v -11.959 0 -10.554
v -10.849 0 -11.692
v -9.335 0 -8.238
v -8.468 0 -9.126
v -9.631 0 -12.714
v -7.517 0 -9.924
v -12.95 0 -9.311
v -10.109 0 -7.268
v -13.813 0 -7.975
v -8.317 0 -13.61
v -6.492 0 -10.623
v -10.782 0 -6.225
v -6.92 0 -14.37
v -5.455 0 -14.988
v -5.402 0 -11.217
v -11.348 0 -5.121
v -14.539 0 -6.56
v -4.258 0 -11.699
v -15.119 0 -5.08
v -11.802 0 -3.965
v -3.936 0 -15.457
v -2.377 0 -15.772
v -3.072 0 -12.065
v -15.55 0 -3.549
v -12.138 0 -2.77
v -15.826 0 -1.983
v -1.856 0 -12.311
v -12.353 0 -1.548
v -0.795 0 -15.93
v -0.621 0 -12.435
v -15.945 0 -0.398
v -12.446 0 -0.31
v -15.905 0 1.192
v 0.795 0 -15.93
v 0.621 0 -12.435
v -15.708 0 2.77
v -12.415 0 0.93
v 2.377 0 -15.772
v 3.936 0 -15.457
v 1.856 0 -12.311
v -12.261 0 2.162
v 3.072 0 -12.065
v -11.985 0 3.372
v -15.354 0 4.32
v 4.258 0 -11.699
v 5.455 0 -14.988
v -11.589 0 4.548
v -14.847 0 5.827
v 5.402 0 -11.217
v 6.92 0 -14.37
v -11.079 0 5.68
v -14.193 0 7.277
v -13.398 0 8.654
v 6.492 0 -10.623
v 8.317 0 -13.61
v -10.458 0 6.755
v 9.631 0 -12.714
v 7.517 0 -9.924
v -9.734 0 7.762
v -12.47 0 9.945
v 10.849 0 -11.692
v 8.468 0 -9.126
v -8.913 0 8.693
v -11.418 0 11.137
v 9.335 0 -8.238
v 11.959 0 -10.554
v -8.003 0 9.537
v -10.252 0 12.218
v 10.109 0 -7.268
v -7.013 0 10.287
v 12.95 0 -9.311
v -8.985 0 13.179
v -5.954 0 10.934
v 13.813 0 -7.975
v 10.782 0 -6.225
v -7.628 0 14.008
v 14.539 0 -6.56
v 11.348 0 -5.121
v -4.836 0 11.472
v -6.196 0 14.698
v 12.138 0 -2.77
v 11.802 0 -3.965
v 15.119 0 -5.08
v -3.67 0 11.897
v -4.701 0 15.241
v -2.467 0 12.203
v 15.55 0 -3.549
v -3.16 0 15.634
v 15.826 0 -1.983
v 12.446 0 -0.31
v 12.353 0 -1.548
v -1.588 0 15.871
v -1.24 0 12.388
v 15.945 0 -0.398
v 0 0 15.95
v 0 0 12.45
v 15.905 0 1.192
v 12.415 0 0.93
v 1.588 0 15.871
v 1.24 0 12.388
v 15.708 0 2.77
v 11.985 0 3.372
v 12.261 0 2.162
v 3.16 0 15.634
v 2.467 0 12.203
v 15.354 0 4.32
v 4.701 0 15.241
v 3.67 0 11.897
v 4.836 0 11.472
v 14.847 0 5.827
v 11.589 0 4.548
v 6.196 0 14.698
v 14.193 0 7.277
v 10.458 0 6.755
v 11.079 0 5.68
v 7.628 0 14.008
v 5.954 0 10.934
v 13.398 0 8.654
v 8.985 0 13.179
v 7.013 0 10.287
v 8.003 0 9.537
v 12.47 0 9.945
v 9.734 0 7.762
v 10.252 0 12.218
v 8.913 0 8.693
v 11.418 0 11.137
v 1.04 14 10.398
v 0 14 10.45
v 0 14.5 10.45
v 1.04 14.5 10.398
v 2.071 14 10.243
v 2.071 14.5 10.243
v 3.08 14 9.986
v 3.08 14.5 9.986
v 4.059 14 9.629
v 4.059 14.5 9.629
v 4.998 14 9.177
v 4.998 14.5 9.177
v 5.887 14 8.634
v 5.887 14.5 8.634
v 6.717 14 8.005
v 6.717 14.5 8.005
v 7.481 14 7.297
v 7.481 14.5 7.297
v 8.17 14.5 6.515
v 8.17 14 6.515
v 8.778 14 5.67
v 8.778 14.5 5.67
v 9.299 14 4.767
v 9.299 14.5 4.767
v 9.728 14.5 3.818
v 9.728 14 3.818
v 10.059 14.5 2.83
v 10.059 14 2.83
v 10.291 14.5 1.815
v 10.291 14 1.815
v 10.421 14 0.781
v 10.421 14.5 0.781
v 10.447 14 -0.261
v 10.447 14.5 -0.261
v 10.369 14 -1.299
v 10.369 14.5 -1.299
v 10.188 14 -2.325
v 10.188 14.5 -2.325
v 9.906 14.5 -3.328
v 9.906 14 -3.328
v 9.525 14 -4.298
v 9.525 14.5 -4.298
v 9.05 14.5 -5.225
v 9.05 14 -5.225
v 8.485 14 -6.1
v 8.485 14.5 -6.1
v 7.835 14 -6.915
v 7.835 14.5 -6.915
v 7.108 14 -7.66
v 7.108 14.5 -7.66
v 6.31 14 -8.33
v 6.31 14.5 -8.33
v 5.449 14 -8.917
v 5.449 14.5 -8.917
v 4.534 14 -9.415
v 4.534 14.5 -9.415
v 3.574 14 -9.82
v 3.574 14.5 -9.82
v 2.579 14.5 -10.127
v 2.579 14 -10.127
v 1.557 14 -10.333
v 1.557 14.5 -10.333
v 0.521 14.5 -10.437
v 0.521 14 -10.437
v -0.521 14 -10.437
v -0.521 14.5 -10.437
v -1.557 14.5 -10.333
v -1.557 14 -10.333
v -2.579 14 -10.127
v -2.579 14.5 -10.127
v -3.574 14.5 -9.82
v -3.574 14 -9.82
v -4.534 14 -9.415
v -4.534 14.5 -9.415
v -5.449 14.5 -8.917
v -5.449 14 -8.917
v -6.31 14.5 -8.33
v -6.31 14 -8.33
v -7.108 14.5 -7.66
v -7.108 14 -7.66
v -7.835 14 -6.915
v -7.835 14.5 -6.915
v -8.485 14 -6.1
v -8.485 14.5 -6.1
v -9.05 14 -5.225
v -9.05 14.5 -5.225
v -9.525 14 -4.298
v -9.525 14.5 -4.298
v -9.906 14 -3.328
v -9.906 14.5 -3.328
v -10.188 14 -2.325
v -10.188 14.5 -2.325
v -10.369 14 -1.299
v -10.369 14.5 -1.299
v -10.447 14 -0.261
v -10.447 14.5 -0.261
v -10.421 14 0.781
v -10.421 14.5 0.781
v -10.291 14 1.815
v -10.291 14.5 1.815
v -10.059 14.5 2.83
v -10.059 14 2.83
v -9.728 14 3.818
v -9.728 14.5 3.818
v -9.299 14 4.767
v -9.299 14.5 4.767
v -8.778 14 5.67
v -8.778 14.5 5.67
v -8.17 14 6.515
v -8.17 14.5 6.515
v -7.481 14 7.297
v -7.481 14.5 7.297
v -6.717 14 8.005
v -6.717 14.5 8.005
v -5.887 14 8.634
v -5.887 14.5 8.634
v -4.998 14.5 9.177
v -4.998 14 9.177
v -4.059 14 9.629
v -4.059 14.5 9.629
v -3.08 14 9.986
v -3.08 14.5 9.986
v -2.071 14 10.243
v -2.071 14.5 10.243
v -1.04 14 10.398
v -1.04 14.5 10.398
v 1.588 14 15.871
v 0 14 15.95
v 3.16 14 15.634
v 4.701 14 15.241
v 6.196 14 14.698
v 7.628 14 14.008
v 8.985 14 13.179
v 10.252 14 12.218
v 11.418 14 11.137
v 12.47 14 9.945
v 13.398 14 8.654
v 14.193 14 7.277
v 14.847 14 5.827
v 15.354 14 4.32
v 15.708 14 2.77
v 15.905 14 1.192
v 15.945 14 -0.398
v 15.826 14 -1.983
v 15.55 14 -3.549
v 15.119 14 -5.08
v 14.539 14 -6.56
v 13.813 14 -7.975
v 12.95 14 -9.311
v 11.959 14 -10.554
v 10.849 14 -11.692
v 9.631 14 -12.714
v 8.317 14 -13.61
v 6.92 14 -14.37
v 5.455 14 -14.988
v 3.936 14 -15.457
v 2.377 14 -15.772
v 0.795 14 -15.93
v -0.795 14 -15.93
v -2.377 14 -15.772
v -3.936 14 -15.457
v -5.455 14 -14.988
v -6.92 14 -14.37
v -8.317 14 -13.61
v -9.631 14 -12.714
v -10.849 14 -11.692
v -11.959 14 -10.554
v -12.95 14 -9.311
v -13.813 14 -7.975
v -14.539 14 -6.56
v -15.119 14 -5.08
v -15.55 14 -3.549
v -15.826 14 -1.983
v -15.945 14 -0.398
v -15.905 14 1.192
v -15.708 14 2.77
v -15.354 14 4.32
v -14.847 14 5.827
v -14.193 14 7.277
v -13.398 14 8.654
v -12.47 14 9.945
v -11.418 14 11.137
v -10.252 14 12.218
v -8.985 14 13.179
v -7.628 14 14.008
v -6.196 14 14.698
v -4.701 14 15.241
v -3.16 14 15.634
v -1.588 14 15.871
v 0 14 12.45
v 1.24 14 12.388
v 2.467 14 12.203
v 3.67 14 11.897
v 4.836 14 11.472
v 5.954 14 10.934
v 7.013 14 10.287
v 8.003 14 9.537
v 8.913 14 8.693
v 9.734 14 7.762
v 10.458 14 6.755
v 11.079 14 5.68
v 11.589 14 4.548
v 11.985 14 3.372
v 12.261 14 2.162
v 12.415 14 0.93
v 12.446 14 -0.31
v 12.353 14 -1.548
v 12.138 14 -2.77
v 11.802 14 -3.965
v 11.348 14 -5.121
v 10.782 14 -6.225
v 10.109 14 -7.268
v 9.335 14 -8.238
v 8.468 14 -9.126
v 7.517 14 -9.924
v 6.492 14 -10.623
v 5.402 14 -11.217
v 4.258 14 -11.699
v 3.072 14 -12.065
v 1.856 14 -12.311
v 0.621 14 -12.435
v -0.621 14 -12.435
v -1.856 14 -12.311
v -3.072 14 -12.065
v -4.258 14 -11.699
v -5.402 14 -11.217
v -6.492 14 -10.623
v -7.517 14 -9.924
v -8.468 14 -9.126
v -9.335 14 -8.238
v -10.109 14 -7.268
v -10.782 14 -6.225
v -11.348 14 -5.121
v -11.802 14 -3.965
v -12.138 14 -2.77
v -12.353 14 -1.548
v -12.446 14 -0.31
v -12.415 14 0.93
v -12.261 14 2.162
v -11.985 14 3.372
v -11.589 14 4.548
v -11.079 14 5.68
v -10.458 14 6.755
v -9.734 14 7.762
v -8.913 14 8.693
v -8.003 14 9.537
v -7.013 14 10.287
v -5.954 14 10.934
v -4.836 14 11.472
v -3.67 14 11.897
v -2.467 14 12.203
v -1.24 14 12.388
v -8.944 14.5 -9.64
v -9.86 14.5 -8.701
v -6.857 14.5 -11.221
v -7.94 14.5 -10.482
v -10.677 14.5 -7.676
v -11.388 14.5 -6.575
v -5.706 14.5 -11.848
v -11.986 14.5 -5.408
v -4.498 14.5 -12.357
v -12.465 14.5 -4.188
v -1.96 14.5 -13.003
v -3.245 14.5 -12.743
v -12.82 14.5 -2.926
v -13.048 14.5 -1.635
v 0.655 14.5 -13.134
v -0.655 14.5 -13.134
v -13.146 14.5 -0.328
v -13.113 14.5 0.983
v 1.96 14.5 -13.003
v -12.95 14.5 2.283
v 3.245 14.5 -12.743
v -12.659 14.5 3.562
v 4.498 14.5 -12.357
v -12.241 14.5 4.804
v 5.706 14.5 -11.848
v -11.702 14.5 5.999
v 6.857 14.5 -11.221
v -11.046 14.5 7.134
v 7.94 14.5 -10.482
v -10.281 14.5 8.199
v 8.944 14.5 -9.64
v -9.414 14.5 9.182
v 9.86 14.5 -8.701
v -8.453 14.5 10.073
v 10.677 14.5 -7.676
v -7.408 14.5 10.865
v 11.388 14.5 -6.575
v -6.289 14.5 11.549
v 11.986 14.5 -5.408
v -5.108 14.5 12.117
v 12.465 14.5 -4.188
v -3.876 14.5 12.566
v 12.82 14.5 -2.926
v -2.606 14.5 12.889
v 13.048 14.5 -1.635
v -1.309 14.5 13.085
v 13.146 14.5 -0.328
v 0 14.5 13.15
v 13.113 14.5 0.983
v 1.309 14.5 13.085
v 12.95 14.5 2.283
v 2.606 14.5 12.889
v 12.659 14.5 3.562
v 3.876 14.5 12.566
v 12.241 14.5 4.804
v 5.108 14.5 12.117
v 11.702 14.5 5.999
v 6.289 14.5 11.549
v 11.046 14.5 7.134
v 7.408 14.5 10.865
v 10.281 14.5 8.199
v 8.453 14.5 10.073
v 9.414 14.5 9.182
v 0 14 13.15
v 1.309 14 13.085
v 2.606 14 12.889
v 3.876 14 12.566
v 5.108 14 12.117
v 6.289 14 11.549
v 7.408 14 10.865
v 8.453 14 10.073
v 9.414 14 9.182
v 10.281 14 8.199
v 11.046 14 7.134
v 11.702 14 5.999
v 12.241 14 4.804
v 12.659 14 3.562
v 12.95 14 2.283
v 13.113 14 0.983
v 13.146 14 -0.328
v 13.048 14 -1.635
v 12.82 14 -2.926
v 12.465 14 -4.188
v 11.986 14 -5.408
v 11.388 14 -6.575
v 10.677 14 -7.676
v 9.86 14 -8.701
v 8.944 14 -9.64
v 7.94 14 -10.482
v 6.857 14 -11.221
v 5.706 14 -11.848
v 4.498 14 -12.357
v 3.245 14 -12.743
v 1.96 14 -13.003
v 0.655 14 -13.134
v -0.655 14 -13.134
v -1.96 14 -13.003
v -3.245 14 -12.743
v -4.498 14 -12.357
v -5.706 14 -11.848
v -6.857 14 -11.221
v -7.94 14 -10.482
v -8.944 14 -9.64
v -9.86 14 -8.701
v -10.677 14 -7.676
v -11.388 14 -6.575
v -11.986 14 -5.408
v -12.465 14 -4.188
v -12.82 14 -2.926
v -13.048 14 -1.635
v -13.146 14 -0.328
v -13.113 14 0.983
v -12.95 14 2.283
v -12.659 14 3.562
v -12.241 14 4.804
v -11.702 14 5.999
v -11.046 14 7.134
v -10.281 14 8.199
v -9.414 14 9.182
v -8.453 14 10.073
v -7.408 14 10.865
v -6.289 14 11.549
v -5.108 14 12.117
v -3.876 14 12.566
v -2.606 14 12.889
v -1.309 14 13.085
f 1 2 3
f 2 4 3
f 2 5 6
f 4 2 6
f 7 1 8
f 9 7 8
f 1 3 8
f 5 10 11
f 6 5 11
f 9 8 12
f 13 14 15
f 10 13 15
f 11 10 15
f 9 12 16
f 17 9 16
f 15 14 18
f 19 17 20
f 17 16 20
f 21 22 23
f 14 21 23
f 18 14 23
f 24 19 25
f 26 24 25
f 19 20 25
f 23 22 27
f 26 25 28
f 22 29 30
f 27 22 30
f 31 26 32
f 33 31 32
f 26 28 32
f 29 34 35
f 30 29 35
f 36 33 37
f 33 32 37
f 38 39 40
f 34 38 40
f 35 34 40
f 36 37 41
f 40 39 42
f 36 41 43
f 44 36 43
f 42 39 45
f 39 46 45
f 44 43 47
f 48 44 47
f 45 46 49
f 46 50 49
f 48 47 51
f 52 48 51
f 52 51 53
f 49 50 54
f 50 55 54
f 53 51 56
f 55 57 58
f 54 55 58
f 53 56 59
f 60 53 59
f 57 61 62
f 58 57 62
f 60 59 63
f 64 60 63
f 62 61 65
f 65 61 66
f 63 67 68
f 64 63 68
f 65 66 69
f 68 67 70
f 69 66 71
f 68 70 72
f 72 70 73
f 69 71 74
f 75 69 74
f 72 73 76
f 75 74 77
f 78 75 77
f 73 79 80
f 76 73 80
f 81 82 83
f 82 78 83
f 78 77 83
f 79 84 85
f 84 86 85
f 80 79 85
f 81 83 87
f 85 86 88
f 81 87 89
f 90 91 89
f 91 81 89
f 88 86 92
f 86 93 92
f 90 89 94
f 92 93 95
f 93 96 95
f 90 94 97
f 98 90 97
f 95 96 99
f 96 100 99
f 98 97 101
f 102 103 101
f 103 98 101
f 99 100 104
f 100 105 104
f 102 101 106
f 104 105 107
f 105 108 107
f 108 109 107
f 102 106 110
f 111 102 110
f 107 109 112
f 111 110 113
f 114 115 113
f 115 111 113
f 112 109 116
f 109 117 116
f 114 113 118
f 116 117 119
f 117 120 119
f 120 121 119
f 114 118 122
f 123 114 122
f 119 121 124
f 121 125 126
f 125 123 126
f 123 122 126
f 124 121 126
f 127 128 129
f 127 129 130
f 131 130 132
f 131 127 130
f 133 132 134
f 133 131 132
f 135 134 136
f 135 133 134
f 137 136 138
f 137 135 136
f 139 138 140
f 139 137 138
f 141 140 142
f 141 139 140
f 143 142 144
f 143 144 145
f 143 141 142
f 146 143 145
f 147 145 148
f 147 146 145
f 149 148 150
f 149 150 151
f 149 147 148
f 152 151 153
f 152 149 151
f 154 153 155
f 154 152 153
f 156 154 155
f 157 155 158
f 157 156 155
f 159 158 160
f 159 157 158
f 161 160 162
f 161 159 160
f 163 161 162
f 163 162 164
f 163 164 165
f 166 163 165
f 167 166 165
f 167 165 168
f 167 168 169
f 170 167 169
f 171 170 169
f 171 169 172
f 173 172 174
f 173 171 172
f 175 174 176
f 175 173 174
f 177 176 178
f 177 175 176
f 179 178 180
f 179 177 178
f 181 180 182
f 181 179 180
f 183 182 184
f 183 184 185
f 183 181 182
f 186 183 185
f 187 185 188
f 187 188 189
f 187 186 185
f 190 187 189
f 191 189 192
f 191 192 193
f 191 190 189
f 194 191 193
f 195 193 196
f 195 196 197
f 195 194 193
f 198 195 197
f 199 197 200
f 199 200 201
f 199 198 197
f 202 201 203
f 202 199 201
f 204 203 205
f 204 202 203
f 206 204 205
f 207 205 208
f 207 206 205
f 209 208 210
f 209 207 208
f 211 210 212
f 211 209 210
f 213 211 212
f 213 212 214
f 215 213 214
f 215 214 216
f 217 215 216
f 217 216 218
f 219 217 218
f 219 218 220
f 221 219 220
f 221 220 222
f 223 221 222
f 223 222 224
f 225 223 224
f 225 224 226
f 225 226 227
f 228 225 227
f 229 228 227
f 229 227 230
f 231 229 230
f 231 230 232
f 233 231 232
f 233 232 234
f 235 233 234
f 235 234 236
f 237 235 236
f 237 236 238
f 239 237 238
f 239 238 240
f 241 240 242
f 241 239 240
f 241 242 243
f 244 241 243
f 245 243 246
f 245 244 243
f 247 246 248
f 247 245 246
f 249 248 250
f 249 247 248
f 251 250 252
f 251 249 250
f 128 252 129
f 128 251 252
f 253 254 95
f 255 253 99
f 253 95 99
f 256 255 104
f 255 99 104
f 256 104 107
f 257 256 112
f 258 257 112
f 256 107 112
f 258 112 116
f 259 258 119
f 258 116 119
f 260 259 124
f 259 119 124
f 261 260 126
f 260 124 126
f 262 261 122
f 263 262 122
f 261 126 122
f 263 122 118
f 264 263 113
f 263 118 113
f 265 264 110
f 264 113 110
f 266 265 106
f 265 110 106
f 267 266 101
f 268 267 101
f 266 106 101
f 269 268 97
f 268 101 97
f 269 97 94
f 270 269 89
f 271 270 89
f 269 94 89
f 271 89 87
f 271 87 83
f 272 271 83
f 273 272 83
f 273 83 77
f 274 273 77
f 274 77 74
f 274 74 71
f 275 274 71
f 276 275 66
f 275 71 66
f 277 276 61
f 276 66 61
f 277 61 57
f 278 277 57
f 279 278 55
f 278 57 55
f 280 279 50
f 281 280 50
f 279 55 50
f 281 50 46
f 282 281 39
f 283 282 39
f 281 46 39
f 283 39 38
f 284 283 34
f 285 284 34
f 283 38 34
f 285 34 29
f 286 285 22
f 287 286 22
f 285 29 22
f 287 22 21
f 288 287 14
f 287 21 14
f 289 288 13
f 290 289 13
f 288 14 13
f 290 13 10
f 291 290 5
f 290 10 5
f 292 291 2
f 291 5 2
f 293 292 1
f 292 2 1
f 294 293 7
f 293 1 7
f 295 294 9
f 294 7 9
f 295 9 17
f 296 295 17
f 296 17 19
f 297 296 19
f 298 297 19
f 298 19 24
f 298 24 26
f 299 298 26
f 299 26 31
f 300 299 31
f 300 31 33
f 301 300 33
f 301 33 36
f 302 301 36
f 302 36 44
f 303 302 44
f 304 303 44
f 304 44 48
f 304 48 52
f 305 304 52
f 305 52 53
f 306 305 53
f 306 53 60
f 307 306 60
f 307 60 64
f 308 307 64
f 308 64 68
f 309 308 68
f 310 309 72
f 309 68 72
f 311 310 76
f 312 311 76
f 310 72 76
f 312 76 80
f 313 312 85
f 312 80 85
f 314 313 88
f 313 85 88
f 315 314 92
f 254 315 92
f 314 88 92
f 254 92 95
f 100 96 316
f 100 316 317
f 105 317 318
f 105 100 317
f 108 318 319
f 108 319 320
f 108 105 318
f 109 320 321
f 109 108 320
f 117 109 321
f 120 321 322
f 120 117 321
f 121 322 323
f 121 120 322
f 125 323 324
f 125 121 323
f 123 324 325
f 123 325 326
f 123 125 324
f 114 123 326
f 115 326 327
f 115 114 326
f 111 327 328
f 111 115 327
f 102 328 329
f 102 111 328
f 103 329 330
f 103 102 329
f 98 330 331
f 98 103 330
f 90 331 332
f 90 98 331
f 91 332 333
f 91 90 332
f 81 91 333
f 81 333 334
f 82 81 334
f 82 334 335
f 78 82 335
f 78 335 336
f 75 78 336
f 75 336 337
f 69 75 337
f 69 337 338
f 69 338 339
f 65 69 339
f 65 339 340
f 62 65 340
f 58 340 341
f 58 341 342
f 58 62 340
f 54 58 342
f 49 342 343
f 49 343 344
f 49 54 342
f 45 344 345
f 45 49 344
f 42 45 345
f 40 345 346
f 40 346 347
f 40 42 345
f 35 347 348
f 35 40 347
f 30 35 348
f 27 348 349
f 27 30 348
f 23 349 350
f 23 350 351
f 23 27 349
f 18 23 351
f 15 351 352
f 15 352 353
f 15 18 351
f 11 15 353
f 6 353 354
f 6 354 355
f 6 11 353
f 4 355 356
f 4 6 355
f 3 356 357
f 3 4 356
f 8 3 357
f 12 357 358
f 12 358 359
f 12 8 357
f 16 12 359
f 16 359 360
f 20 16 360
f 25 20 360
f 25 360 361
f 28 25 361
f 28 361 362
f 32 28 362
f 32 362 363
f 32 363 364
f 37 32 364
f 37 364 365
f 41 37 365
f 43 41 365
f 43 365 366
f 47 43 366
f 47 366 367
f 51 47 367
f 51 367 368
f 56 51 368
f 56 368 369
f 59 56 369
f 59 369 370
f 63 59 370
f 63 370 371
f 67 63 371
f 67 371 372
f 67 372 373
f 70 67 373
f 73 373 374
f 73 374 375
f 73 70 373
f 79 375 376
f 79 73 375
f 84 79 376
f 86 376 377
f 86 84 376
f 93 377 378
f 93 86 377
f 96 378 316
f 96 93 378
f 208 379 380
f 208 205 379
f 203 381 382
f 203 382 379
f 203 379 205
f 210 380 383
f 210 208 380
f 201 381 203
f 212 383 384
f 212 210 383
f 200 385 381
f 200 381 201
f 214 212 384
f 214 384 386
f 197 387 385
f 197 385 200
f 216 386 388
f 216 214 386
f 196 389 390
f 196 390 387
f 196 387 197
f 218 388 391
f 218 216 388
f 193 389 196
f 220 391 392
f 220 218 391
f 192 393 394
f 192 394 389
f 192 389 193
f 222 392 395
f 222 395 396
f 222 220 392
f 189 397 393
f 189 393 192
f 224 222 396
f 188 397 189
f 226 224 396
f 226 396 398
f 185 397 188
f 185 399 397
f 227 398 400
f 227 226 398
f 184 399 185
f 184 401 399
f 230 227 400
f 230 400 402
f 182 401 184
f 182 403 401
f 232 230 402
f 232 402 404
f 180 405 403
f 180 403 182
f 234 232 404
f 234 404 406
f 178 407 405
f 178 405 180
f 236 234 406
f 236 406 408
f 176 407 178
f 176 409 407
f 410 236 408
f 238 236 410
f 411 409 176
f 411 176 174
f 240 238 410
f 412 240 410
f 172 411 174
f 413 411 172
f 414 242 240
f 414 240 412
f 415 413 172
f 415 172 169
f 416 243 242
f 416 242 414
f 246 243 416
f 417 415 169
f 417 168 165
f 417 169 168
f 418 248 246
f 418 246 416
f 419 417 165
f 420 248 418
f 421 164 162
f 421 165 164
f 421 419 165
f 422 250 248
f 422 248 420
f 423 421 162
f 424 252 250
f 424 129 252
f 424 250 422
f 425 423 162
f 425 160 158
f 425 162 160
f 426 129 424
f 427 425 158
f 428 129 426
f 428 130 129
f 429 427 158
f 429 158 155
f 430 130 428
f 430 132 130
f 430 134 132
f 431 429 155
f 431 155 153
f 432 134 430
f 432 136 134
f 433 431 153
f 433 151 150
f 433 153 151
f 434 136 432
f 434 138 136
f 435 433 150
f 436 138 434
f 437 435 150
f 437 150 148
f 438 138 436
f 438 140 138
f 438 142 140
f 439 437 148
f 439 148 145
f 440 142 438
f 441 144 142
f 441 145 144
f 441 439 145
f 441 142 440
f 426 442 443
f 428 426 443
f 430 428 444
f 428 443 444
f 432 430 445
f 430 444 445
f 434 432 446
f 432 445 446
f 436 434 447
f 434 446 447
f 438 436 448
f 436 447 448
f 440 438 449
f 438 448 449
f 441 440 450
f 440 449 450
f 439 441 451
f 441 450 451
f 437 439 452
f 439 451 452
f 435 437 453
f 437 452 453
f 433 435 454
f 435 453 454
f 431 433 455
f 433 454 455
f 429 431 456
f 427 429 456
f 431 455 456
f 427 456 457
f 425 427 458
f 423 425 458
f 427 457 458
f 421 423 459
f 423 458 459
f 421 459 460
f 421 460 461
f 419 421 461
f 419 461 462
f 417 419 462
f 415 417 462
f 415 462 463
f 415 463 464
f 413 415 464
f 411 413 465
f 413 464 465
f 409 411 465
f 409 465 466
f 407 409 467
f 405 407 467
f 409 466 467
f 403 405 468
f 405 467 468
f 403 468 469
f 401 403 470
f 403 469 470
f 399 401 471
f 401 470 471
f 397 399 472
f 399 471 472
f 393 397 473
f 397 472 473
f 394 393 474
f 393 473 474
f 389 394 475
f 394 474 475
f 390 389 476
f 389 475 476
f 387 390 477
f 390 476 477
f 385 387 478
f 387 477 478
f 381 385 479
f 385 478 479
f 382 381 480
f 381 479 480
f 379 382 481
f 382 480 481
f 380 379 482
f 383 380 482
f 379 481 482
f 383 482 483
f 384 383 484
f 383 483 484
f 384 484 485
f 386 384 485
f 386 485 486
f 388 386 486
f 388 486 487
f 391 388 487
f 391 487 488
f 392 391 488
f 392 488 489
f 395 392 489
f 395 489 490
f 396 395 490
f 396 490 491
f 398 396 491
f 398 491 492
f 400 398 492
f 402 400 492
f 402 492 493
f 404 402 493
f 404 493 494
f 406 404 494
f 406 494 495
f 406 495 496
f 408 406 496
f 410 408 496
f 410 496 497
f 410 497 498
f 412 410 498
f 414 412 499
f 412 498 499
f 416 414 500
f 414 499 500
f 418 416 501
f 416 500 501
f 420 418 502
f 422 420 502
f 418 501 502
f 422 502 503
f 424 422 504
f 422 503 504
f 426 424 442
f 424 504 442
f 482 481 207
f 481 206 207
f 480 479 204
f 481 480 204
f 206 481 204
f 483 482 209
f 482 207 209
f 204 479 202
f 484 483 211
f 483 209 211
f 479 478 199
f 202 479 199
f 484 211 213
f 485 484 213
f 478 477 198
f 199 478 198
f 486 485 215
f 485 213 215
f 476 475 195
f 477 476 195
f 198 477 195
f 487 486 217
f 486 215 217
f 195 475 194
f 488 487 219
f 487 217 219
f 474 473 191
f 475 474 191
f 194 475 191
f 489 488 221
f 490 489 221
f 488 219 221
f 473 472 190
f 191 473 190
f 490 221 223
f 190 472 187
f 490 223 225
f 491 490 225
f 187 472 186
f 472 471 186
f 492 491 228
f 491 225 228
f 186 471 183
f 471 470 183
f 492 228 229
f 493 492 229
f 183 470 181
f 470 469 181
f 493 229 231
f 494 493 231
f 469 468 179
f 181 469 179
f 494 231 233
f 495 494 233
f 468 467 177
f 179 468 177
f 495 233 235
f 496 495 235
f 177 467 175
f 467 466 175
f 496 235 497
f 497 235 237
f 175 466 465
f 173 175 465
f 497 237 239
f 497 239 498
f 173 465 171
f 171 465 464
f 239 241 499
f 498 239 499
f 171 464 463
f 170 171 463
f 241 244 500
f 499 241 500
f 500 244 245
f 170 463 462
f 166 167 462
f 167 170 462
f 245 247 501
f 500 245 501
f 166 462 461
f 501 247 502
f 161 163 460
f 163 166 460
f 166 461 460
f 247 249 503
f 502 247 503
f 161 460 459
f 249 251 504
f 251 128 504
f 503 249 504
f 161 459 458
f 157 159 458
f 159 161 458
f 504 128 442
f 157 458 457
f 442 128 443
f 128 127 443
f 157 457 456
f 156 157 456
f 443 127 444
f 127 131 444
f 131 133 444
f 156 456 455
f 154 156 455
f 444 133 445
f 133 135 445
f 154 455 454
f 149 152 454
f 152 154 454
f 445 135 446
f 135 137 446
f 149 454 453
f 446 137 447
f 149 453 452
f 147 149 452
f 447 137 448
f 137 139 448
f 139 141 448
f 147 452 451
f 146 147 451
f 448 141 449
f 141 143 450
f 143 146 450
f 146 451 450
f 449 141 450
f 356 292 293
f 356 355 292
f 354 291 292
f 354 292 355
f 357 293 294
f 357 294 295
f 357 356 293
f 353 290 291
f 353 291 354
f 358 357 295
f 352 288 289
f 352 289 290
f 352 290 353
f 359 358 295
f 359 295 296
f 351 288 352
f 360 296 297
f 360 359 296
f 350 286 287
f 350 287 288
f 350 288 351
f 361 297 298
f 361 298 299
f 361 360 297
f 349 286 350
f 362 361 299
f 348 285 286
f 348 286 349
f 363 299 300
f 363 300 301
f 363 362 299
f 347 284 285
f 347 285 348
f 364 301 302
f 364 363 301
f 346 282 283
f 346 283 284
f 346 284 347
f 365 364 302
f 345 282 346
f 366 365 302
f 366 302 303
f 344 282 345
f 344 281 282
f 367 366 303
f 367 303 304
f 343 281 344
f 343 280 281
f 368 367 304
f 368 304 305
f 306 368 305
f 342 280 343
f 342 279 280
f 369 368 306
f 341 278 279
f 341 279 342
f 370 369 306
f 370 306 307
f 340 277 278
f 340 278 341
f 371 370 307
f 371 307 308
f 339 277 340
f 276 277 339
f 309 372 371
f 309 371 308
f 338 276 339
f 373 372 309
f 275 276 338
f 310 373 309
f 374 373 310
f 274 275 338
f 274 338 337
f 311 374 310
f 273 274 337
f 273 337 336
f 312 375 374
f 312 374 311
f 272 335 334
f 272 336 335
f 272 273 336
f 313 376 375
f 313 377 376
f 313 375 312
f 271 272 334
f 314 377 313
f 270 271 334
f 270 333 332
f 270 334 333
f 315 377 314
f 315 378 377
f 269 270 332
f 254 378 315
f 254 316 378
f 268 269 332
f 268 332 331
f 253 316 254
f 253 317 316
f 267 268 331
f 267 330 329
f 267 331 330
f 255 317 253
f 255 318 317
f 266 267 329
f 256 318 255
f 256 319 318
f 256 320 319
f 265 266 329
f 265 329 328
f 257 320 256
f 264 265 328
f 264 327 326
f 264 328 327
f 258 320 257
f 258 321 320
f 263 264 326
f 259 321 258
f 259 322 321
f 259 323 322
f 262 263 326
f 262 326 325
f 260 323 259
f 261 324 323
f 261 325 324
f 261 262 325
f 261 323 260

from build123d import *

# Parameters (mm, degrees)
SKETCH2_R           = 15.95
SKETCH2_R_2         = 12.45
BOSS_EXTRUDE1_DEPTH = 14
SKETCH3_R           = 13.15
SKETCH3_R_2         = 12.45
SKETCH3_R_3         = 10.45
BOSS_EXTRUDE2_DEPTH = 0.5


with BuildPart() as part:
    # Sketch2 → Boss-Extrude1 (new body)
    with BuildSketch(Plane(origin=(0, 0, 0), x_dir=(1, 0, 0), z_dir=(0, 1, 0))):
        with Locations(Location((0, 0, 0), (0, 0, 270))):
            Circle(SKETCH2_R)
        with Locations(Location((0, 0, 0), (0, 0, 270))):
            Circle(SKETCH2_R_2, mode=Mode.SUBTRACT)
    extrude(amount=BOSS_EXTRUDE1_DEPTH)


with BuildPart() as body_2:
    # Sketch3 → Boss-Extrude2 (new body)
    with BuildSketch(Plane(origin=(0, 14, 0), x_dir=(1, 0, 0), z_dir=(0, 1, 0))):
        with Locations(Location((0, 0, 0), (0, 0, 270))):
            Circle(SKETCH3_R)
        with Locations(Location((0, 0, 0), (0, 0, 270))):
            Circle(SKETCH3_R_2, mode=Mode.SUBTRACT)
        with Locations(Location((0, 0, 0), (0, 0, 270))):
            Circle(SKETCH3_R_2)
        with Locations(Location((0, 0, 0), (0, 0, 270))):
            Circle(SKETCH3_R_3, mode=Mode.SUBTRACT)
    extrude(amount=BOSS_EXTRUDE2_DEPTH)


solid = Compound([part.part, body_2.part])
